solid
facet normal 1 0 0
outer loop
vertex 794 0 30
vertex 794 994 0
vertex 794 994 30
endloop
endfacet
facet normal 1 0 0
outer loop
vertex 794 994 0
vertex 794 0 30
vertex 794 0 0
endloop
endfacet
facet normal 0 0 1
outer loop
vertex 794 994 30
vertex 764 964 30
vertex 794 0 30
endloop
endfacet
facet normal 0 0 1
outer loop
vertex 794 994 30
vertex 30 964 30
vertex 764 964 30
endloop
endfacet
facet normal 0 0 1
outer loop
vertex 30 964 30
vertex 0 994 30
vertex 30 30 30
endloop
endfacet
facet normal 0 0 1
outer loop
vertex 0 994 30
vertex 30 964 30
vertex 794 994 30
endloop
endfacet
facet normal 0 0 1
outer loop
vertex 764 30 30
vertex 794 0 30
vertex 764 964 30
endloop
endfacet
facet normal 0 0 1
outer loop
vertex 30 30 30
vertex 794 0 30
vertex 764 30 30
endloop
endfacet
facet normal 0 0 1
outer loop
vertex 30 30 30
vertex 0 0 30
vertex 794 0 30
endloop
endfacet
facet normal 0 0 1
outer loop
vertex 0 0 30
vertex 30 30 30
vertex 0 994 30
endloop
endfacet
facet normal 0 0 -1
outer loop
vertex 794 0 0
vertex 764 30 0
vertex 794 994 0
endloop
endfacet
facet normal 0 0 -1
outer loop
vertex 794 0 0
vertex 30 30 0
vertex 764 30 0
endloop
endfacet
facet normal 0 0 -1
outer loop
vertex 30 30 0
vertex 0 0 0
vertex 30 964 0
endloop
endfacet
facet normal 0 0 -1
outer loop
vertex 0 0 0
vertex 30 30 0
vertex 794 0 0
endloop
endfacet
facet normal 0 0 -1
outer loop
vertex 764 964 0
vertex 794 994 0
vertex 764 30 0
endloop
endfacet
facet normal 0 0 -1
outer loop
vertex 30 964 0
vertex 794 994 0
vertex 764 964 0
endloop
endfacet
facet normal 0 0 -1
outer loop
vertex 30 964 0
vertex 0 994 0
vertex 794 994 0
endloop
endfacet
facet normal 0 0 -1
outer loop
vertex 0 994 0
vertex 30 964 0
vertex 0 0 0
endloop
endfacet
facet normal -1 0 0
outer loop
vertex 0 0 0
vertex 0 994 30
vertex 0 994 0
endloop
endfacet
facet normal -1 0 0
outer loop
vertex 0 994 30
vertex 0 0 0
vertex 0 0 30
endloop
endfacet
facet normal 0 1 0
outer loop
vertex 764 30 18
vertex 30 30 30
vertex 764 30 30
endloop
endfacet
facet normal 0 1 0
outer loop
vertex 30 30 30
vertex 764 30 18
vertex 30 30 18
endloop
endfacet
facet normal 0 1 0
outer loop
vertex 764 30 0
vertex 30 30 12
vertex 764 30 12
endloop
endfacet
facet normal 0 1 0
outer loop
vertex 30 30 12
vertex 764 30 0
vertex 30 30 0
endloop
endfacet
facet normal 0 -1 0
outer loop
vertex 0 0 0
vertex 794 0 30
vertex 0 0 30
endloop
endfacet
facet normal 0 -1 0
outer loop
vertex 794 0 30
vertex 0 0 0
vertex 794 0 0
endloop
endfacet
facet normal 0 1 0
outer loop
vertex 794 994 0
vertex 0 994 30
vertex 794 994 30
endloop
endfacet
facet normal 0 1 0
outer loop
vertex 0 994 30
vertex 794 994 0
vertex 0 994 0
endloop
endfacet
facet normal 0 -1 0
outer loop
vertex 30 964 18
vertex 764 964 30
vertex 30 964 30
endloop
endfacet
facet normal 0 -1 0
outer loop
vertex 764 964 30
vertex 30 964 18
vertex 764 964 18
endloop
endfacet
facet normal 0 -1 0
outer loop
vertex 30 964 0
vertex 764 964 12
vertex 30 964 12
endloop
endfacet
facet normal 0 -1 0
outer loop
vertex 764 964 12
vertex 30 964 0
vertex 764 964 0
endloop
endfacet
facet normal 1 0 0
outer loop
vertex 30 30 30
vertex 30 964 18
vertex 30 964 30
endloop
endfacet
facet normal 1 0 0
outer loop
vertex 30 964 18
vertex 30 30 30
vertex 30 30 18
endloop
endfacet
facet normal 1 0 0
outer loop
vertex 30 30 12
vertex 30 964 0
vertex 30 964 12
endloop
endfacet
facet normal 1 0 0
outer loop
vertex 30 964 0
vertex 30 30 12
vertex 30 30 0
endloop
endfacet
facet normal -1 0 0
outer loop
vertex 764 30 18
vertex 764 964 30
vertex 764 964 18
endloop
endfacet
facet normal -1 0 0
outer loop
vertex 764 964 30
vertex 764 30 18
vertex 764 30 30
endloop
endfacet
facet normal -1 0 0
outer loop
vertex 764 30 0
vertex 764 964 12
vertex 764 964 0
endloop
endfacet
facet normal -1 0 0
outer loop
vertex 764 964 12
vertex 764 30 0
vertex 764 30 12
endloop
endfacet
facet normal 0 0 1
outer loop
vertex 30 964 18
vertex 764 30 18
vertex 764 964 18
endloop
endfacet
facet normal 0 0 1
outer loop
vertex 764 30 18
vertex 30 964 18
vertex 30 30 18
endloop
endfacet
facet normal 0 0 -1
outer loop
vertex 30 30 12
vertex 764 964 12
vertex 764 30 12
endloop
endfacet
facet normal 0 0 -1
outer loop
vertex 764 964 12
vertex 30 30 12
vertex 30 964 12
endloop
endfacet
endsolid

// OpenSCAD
// file: ../config/TF3D-SDC-01_dimensions.scad
// Modelo fijo TF3D-SDC-01 — unidades en mm
CABINET_W = 800;
CABINET_H = 1000;
CABINET_D = 500;
BOARD_T = 18;
INNER_W = CABINET_W - 2*BOARD_T;
INNER_H = CABINET_H - 2*BOARD_T;
BACK_W = INNER_W;
BACK_H = INNER_H;
BACK_T = BOARD_T;
SHELF_W = INNER_W;
SHELF_D = 450;
SHELF_T = BOARD_T;
TECH_H = 160;
SHELF_Z_1 = 250;
SHELF_Z_2 = 480;
SHELF_Z_3 = 710;
MELAMINE = [0.94,0.94,0.94];
ACRYLIC = [0.65,0.85,1.00,0.30];
METAL = [0.10,0.10,0.10];
// file: ../config/common.scad
include <TF3D-SDC-01_dimensions.scad>
module board(size=[100,100,18], board_color=MELAMINE){ color(board_color) cube(size); }
// main file
include <../config/common.scad>
door_gap=3; door_w=CABINET_W-2*door_gap; door_h=CABINET_H-2*door_gap; frame=30; acrylic_t=6;
module frame_bar(size){ color(METAL) cube(size); }
module door(){
 frame_bar([door_w,frame,frame]);
 translate([0,door_h-frame,0]) frame_bar([door_w,frame,frame]);
 frame_bar([frame,door_h,frame]);
 translate([door_w-frame,0,0]) frame_bar([frame,door_h,frame]);
 translate([frame,frame,(frame-acrylic_t)/2]) color(ACRYLIC) cube([door_w-2*frame,door_h-2*frame,acrylic_t]);
}
door();
